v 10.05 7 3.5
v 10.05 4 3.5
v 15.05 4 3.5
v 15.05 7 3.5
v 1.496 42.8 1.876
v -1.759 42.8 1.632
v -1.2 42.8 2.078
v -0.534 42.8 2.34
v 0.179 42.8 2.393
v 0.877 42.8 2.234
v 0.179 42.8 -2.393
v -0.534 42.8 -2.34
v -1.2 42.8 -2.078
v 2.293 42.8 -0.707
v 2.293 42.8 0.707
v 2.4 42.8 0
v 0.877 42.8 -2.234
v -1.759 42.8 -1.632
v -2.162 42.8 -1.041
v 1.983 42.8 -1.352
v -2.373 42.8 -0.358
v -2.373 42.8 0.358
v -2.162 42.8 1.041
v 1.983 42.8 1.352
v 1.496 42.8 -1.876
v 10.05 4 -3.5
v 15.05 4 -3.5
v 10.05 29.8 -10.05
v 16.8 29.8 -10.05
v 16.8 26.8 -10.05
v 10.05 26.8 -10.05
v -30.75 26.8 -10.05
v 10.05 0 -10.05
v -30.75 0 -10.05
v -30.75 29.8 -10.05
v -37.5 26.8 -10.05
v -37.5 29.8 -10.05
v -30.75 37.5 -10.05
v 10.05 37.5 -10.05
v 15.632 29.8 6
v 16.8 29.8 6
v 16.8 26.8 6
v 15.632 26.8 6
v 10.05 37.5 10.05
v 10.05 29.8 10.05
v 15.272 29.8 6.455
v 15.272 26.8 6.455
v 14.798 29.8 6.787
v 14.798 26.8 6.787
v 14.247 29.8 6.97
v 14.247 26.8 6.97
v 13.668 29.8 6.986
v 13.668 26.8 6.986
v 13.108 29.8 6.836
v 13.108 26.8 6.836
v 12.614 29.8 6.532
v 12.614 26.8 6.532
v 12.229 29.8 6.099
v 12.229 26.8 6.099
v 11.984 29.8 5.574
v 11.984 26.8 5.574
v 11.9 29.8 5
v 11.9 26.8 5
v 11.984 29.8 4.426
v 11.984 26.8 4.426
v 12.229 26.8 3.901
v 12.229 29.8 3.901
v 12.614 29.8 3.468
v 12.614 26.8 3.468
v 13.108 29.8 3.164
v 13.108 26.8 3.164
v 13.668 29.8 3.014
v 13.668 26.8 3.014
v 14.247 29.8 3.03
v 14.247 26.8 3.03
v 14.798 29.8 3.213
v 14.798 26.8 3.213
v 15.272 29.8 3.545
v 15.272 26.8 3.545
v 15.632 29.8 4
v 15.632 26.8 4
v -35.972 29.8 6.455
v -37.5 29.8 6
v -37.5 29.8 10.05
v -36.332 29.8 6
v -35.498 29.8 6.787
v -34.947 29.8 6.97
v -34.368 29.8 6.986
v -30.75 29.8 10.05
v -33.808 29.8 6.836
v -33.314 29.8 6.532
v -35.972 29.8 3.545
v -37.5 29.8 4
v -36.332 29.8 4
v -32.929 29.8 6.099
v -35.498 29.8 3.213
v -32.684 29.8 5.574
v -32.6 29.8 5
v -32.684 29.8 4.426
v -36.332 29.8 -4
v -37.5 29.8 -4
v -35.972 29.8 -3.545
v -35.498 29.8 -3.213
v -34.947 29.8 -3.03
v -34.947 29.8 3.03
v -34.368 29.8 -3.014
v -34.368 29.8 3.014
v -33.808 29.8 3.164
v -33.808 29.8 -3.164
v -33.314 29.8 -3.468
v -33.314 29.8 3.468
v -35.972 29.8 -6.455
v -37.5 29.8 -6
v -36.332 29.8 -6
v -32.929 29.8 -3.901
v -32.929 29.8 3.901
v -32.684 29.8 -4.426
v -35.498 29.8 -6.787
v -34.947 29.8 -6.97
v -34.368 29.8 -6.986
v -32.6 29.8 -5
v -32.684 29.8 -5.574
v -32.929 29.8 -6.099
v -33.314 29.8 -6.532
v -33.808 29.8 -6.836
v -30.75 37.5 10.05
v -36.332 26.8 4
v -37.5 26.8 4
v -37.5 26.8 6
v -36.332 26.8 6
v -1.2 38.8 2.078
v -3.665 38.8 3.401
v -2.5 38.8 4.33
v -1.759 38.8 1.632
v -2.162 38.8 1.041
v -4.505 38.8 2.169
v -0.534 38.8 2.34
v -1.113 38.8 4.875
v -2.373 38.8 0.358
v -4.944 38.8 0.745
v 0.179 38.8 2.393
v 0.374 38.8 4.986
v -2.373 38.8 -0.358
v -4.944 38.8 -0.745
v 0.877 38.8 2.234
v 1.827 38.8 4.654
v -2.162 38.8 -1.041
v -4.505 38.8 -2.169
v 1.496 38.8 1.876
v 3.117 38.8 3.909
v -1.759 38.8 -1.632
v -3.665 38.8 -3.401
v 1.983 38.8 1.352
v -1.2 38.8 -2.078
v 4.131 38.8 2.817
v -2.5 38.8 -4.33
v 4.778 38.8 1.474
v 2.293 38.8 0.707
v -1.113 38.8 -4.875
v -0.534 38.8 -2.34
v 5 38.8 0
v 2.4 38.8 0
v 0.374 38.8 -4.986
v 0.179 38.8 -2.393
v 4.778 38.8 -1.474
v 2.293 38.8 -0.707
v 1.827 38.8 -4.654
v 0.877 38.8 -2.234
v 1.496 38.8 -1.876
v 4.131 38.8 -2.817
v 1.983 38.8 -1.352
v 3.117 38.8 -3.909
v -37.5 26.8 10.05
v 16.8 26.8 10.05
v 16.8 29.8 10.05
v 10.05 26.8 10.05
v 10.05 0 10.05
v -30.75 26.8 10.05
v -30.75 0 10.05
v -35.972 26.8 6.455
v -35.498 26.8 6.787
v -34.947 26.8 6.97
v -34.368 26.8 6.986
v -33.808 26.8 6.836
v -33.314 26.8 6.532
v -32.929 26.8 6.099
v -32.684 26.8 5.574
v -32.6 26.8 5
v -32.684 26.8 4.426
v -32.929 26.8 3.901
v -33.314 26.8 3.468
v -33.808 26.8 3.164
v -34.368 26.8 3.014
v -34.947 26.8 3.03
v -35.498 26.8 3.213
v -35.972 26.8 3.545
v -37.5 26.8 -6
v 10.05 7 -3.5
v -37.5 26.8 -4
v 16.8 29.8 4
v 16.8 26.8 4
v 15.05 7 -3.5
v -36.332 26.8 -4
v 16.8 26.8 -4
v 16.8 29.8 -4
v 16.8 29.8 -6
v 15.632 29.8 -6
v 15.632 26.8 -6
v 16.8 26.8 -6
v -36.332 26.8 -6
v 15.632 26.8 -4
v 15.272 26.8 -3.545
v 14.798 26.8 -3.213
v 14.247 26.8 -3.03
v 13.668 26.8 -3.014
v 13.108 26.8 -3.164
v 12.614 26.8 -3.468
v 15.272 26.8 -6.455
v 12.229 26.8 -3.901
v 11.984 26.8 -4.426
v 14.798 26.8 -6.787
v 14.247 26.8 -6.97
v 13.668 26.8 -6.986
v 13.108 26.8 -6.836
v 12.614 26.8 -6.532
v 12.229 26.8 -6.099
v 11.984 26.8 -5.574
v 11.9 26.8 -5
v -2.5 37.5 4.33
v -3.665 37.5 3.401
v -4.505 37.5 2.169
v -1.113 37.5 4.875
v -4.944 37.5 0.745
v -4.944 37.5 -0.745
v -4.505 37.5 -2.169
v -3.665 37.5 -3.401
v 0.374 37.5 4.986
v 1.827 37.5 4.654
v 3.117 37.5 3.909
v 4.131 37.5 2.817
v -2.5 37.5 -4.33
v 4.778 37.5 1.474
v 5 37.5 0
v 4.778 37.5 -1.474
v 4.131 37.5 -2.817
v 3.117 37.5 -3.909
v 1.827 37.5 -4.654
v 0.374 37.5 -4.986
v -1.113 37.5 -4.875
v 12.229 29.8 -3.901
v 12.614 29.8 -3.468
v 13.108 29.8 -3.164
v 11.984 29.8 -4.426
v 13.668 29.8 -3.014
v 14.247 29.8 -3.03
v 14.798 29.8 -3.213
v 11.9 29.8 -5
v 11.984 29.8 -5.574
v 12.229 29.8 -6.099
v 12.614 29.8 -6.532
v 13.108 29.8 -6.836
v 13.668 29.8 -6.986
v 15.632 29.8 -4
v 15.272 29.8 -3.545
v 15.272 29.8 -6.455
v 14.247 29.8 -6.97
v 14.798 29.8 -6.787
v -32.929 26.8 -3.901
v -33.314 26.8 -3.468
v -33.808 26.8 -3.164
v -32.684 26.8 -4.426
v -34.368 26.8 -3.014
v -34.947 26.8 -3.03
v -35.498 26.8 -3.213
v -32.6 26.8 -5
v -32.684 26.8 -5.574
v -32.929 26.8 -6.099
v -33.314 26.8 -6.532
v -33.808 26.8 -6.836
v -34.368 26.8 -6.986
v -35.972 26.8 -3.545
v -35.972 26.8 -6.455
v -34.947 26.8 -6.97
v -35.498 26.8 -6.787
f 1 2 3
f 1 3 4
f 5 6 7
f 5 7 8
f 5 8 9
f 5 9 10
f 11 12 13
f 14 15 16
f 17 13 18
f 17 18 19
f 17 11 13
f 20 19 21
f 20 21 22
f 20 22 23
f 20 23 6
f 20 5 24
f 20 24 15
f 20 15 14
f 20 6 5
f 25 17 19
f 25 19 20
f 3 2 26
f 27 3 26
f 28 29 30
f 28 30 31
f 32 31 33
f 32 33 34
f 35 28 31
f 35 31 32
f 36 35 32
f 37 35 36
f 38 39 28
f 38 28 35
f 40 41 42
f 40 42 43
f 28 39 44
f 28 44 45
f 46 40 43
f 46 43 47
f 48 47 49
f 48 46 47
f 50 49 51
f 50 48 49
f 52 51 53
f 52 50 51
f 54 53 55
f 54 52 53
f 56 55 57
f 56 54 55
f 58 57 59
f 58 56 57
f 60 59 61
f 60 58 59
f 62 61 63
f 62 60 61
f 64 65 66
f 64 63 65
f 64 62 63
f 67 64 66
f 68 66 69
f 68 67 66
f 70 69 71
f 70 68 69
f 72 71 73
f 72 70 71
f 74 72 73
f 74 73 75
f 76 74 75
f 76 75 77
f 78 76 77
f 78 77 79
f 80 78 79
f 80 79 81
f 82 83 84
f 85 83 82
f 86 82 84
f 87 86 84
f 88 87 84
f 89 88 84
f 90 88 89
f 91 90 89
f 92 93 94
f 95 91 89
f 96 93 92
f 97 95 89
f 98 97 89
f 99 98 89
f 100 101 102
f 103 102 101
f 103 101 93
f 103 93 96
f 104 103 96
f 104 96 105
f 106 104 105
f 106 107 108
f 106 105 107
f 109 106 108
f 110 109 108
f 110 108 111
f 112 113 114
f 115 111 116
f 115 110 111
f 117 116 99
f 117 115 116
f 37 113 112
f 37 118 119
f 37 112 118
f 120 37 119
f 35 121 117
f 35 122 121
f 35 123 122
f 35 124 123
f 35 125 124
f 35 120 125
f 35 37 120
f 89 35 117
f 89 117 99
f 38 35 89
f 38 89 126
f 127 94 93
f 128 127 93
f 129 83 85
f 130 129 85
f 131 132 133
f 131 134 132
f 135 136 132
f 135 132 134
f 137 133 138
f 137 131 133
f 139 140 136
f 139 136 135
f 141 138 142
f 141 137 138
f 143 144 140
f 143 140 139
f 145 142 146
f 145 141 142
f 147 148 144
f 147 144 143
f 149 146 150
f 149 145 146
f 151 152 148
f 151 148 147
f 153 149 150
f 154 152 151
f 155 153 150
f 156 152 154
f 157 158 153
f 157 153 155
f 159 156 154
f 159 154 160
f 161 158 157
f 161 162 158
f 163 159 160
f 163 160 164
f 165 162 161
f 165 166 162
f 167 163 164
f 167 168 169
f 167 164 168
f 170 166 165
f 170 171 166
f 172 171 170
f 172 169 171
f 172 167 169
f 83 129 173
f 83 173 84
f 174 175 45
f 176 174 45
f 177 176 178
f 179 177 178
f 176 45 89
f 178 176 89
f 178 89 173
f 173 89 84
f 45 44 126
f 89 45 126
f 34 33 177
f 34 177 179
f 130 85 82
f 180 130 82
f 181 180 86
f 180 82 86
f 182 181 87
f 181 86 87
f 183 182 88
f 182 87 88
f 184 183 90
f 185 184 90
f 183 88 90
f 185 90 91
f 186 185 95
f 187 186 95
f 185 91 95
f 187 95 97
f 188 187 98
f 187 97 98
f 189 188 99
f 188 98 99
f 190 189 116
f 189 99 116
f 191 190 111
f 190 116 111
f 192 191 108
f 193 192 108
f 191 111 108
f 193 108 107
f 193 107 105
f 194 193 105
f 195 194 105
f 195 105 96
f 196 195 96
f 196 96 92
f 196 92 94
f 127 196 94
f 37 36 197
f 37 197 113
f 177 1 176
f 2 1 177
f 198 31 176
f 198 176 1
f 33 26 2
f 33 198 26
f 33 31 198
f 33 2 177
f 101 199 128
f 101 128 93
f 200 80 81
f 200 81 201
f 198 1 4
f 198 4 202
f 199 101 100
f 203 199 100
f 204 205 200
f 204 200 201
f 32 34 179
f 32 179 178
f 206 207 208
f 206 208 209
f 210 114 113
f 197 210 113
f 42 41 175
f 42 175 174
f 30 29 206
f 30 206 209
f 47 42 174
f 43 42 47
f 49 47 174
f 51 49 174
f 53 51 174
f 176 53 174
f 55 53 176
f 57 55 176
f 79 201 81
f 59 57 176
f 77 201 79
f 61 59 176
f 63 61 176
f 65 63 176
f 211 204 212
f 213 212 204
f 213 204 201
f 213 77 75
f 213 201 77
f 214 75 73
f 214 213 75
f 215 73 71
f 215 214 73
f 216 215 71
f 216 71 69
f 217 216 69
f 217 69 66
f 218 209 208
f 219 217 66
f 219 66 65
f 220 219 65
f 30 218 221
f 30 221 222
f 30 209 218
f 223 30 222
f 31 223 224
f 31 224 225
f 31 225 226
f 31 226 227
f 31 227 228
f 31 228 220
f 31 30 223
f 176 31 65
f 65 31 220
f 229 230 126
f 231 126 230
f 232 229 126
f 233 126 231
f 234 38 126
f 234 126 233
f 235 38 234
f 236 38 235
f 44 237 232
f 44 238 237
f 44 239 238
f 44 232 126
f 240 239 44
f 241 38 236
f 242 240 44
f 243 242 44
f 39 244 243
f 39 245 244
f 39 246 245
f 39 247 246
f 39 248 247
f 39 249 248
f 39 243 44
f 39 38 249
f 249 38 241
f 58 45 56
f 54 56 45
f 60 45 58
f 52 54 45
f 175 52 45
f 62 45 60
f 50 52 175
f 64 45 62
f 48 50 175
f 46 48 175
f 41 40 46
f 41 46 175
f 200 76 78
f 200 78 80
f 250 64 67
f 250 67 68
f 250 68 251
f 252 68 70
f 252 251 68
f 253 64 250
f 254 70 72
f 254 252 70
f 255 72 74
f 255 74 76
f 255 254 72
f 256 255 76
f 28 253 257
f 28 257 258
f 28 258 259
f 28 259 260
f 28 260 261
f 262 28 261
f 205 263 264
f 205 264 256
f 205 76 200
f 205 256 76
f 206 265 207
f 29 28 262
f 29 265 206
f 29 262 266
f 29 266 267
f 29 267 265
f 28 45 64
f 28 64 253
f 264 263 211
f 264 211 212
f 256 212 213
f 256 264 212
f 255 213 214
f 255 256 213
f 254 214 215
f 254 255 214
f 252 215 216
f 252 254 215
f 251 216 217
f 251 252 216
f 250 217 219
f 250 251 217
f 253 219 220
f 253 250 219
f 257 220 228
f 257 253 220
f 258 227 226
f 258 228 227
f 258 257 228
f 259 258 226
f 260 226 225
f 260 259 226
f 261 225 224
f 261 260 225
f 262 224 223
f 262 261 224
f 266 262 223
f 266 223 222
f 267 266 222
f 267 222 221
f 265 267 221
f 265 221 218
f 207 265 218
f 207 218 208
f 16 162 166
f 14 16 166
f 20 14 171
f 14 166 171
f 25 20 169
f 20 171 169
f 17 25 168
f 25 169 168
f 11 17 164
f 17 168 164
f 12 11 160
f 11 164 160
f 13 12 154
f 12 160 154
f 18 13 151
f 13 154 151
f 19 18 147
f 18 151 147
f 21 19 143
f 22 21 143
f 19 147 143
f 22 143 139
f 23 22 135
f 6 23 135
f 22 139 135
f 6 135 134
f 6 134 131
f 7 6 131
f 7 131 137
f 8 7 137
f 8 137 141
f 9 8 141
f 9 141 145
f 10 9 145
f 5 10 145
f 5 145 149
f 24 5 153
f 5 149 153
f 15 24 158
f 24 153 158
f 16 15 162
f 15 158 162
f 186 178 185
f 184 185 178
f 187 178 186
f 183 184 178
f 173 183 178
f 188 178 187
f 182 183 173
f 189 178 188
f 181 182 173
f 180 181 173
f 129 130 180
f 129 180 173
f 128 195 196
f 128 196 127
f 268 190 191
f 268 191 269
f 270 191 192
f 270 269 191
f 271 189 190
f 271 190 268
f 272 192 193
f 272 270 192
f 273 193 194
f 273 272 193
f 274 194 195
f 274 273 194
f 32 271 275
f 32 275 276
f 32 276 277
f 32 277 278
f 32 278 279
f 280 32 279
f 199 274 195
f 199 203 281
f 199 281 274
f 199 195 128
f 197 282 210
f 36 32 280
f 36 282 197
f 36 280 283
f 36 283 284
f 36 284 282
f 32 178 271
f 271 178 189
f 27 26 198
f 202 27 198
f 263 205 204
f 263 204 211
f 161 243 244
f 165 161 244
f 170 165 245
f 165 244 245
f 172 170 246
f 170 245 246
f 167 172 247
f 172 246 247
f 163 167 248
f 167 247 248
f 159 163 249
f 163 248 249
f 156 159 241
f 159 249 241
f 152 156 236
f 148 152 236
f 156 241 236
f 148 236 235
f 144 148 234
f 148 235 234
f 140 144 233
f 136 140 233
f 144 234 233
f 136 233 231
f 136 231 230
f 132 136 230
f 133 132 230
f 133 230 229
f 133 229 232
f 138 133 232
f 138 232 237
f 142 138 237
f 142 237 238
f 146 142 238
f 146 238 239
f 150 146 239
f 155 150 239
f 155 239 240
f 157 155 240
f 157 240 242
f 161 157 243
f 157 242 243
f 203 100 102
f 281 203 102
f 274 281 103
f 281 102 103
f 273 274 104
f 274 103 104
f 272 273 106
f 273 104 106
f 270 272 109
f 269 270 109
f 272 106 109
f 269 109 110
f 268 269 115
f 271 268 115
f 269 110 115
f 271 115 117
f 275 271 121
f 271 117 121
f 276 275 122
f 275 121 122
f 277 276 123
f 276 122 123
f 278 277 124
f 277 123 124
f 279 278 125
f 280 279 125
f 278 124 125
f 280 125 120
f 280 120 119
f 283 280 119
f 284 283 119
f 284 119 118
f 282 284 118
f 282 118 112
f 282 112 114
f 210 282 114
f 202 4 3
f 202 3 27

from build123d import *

# Parameters (mm, degrees)
BOSS_EXTRUDE1_START = -10.05
BOSS_EXTRUDE1_DEPTH = 20.1
CUT_EXTRUDE1_DEPTH  = 30.8
SKETCH5_R           = 5
BOSS_EXTRUDE2_DEPTH = 1.3
SKETCH6_R           = 2.4
BOSS_EXTRUDE3_DEPTH = 4
SKETCH8_W           = 7
SKETCH8_H           = 3
BOSS_EXTRUDE4_DEPTH = 5


with BuildPart() as part:
    # Sketch3 → Boss-Extrude1 (new body)
    with BuildSketch(Plane.XY.offset(BOSS_EXTRUDE1_START)):
        Polygon((-30.75, 0), (-30.75, 26.8), (-37.5, 26.8), (-37.5, 29.8), (-30.75, 29.8), (-30.75, 37.5), (10.05, 37.5), (10.05, 29.8), (16.8, 29.8), (16.8, 26.8), (10.05, 26.8), (10.05, 0), align=None)
    extrude(amount=BOSS_EXTRUDE1_DEPTH)

    # Sketch4 → Cut-Extrude1 (cut, through all)
    with BuildSketch(Plane(origin=(0, 29.8, 0), x_dir=(1, 0, 0), z_dir=(0, 1, 0))):
        with BuildLine():
            Line((-37.5, 6), (-37.5, 4))
            Line((-37.5, 4), (-36.332050808, 4))
            ThreePointArc((-36.332050808, 4), (-32.6, 5), (-36.332050808, 6))
            Line((-36.332050808, 6), (-37.5, 6))
        make_face()
        with BuildLine():
            Line((16.8, -6), (15.632050808, -6))
            ThreePointArc((15.632050808, -6), (11.9, -5), (15.632050808, -4))
            Line((15.632050808, -4), (16.8, -4))
            Line((16.8, -4), (16.8, -6))
        make_face()
        with BuildLine():
            Line((-37.5, -4), (-37.5, -6))
            Line((-37.5, -6), (-36.332050808, -6))
            ThreePointArc((-36.332050808, -6), (-32.6, -5), (-36.332050808, -4))
            Line((-36.332050808, -4), (-37.5, -4))
        make_face()
        with BuildLine():
            Line((16.8, 4), (15.632050808, 4))
            ThreePointArc((15.632050808, 4), (11.9, 5), (15.632050808, 6))
            Line((15.632050808, 6), (16.8, 6))
            Line((16.8, 6), (16.8, 4))
        make_face()
    extrude(amount=-CUT_EXTRUDE1_DEPTH, mode=Mode.SUBTRACT)

    # Sketch5 → Boss-Extrude2 (add)
    with BuildSketch(Plane(origin=(0, 37.5, 0), x_dir=(1, 0, 0), z_dir=(0, 1, 0))):
        Circle(SKETCH5_R)
    extrude(amount=BOSS_EXTRUDE2_DEPTH)

    # Sketch6 → Boss-Extrude3 (add)
    with BuildSketch(Plane(origin=(0, 38.8, 0), x_dir=(1, 0, 0), z_dir=(0, 1, 0))):
        Circle(SKETCH6_R)
    extrude(amount=BOSS_EXTRUDE3_DEPTH)

    # Sketch8 → Boss-Extrude4 (add)
    with BuildSketch(Plane(origin=(10.05, 0, 0), x_dir=(0, 0, -1), z_dir=(1, 0, 0))):
        with Locations((0, 5.5)):
            Rectangle(SKETCH8_W, SKETCH8_H)
    extrude(amount=BOSS_EXTRUDE4_DEPTH)


solid = part.part
